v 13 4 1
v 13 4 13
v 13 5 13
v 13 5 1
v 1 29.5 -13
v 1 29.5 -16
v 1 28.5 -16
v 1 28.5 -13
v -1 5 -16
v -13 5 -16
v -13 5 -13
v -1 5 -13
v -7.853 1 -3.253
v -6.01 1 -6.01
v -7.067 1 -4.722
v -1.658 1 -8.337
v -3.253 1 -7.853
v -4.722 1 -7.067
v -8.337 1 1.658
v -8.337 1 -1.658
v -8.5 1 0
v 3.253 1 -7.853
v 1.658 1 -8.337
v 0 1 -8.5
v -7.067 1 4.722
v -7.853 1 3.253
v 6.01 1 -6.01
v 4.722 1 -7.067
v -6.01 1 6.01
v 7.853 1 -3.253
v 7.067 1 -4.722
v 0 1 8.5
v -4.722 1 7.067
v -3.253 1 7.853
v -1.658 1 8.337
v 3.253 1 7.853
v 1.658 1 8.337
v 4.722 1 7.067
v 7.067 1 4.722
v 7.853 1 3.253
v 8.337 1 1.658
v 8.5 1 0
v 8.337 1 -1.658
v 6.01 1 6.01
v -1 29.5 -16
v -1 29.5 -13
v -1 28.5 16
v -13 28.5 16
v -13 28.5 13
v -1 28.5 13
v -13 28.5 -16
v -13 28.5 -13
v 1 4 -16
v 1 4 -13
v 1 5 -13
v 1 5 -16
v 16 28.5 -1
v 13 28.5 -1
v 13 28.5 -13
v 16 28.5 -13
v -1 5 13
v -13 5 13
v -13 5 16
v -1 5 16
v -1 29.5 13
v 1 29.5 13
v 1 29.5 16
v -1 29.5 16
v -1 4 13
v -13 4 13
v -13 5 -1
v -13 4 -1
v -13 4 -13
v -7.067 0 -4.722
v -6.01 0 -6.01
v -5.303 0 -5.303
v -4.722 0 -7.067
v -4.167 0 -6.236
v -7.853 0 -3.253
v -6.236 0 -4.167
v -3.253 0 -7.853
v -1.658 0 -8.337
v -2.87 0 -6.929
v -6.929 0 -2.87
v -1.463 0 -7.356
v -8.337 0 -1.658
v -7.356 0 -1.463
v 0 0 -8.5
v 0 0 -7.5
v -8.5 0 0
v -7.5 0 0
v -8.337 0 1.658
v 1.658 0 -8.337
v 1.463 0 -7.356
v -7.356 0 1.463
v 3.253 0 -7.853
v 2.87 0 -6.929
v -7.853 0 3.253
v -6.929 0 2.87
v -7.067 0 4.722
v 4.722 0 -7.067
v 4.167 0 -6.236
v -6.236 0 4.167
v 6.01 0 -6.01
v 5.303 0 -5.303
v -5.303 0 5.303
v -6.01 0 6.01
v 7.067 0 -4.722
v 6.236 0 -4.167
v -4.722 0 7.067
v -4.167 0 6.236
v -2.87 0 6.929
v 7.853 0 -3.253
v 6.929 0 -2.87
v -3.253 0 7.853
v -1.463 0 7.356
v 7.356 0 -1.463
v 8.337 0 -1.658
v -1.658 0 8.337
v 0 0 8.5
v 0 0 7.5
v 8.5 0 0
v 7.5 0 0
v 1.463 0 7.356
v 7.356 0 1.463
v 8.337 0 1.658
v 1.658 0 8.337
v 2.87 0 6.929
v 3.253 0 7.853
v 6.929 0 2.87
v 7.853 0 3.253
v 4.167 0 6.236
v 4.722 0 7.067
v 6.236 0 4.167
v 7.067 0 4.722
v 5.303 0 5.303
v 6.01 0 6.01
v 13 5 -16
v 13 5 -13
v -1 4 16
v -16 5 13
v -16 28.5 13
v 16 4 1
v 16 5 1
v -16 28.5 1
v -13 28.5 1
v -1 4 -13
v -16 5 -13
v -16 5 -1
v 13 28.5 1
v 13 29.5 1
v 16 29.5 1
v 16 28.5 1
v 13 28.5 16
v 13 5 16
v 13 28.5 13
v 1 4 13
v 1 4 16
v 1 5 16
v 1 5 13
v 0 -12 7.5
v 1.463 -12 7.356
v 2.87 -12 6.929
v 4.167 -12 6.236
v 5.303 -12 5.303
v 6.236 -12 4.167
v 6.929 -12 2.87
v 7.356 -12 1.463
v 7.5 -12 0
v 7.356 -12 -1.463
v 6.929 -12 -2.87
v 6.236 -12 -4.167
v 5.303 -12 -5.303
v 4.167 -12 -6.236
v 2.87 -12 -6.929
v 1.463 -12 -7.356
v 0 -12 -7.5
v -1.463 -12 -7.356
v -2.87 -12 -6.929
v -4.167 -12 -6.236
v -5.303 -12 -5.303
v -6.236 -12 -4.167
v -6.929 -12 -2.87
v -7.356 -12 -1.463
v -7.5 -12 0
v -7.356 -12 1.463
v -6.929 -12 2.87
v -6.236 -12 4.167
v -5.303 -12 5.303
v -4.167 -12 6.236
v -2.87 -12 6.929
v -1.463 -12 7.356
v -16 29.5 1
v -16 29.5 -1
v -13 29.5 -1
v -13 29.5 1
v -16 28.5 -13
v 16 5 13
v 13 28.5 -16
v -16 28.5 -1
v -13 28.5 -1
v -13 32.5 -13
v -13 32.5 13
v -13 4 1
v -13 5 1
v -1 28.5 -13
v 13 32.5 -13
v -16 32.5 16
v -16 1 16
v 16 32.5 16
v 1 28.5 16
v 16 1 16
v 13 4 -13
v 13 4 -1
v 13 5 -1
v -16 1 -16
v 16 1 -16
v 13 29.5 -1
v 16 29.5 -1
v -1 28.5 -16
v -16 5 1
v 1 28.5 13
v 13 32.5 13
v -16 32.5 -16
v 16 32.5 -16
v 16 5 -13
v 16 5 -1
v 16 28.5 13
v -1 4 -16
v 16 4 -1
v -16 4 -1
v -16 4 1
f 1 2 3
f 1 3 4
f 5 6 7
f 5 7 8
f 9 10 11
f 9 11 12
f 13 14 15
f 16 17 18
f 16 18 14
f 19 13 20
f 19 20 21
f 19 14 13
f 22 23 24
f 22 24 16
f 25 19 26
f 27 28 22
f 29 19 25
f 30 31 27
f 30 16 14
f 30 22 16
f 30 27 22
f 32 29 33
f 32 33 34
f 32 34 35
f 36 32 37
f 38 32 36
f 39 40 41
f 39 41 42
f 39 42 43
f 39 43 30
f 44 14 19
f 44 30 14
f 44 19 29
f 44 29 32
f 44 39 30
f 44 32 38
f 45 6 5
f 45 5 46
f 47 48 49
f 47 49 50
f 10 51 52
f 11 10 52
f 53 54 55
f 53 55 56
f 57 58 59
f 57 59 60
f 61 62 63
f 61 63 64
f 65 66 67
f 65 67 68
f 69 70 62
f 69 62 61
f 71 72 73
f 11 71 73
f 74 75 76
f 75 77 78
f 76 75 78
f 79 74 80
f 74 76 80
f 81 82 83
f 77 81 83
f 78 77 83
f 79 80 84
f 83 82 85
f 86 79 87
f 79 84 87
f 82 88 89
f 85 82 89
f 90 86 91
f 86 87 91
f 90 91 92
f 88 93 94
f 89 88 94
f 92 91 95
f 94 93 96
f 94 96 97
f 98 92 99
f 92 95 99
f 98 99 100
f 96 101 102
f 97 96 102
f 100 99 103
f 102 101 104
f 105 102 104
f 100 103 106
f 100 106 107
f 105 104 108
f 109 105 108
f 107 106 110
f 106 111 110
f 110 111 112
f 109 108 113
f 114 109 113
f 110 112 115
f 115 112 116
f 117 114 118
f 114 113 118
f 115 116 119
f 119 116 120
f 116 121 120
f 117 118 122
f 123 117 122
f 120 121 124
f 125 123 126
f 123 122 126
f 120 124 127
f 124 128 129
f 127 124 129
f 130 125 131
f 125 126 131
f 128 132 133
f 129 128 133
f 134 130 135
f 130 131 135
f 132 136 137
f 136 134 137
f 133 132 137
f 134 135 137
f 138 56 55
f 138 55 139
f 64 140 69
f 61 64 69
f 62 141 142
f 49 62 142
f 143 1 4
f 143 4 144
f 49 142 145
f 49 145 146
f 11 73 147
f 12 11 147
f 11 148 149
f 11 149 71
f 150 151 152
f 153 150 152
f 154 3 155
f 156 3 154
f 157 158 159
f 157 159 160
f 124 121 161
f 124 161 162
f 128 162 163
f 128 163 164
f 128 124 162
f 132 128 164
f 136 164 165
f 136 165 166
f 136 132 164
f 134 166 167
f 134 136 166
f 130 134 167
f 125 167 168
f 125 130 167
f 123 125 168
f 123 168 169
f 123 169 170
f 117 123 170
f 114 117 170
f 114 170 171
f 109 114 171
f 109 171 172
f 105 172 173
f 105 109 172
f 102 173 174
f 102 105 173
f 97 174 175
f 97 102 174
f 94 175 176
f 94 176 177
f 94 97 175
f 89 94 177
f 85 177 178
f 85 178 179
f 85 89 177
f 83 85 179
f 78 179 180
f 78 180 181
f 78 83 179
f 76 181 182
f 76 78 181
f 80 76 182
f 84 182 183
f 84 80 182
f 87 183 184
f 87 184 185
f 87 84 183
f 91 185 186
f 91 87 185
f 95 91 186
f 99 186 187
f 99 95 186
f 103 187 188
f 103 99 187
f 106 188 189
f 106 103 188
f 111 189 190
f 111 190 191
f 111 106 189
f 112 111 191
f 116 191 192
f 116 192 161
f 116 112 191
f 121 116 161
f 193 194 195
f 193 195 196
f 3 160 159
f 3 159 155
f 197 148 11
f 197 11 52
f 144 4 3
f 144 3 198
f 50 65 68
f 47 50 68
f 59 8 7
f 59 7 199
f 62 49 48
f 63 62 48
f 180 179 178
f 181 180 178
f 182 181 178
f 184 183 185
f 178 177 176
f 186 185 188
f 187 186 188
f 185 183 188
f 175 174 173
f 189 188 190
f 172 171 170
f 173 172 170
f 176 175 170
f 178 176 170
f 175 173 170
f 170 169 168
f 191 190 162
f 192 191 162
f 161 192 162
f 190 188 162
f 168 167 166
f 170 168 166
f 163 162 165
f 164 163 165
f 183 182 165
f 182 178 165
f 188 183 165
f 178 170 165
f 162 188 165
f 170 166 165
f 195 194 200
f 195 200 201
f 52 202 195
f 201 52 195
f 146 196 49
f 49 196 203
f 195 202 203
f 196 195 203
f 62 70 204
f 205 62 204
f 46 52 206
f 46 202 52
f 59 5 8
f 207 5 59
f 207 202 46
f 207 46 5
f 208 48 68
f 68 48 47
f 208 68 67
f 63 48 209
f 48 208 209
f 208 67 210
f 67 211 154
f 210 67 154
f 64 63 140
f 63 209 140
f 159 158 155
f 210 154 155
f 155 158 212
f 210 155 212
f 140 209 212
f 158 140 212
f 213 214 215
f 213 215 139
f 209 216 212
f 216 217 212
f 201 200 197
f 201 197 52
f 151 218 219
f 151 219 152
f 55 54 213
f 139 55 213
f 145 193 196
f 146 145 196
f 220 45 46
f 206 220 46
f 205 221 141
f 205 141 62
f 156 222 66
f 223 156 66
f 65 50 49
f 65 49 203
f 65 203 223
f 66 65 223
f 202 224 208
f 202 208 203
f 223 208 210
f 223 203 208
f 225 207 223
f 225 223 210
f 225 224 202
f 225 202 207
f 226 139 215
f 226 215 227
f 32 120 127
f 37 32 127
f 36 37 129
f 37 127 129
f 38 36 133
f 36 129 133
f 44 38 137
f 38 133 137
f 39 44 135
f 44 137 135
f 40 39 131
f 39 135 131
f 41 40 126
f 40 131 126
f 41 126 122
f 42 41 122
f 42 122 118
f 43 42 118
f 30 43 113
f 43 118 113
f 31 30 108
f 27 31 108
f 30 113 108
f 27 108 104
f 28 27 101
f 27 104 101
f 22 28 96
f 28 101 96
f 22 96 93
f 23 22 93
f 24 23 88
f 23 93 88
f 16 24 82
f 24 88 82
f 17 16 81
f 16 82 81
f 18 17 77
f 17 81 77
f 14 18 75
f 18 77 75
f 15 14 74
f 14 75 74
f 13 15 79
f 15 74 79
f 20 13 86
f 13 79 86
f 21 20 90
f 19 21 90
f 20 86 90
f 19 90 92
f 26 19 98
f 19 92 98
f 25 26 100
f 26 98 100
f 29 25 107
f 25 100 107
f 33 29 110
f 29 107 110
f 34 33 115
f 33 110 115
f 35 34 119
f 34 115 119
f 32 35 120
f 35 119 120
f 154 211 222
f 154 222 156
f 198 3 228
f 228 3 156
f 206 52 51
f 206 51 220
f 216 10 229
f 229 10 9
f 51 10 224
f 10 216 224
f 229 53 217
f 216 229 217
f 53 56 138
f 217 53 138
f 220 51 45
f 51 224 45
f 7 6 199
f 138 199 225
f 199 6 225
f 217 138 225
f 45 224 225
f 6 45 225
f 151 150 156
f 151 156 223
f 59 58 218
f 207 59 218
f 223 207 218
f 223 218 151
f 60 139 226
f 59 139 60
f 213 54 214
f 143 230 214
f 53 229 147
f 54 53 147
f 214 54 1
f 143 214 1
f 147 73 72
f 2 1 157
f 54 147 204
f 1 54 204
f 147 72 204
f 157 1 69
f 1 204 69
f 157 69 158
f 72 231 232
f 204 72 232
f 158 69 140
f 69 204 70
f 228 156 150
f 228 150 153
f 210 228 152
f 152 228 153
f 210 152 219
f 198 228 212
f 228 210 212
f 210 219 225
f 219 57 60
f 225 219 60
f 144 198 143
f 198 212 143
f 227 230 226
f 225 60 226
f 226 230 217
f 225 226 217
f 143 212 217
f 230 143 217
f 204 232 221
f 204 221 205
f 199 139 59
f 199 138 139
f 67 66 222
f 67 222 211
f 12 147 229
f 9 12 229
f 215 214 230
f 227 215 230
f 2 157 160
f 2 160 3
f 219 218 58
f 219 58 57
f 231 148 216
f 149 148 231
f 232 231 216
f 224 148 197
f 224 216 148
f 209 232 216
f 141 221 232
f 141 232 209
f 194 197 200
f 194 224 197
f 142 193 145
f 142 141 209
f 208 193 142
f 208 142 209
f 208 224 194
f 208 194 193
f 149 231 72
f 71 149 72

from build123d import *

# Parameters (mm, degrees)
ESQUISSE1_R             = 7.5
BOSS_EXTRU_1_DEPTH      = 12
ESQUISSE2_R             = 8.5
BOSS_EXTRU_2_DEPTH      = 1
ESQUISSE3_W             = 32
ESQUISSE3_H             = 32
ESQUISSE3_W_2           = 26
ESQUISSE3_H_2           = 26
ESQUISSE3_R             = 8.5
BOSS_EXTRU_3_DEPTH      = 31.5
ESQUISSE7_W             = 26
ESQUISSE7_H             = 26
ENL_V_MAT_EXTRU_2_DEPTH = 37.390245946
ESQUISSE8_W             = 26
ESQUISSE8_H             = 25.5
ENL_V_MAT_EXTRU_3_DEPTH = 49.334770094
ESQUISSE9_W             = 26
ESQUISSE9_H             = 25.5
ENL_V_MAT_EXTRU_4_DEPTH = 49.334770094
ESQUISSE10_W            = 12
ESQUISSE10_H            = 3
ESQUISSE10_W_2          = 3
ESQUISSE10_H_2          = 12
BOSS_EXTRU_5_DEPTH      = 1
ESQUISSE12_W            = 3
ESQUISSE12_H            = 12
BOSS_EXTRU_9_DEPTH      = 1
ESQUISSE13_W            = 12
ESQUISSE13_H            = 3
BOSS_EXTRU_10_DEPTH     = 1


with BuildPart() as part:
    # Esquisse1 → Boss.-Extru.1 (new body)
    with BuildSketch(Plane(origin=(0, 0, 0), x_dir=(1, 0, 0), z_dir=(0, 1, 0))):
        with Locations(Location((0, 0, 0), (0, 0, 270))):
            Circle(ESQUISSE1_R)
    extrude(amount=-BOSS_EXTRU_1_DEPTH)

    # Esquisse2 → Boss.-Extru.2 (add)
    with BuildSketch(Plane(origin=(0, 0, 0), x_dir=(1, 0, 0), z_dir=(0, 1, 0))):
        with Locations(Location((0, 0, 0), (0, 0, 270))):
            Circle(ESQUISSE2_R)
    extrude(amount=BOSS_EXTRU_2_DEPTH)


with BuildPart() as body_2:
    # Esquisse3 → Boss.-Extru.3 (new body)
    # profile 1 of 3: a face of its own
    with BuildSketch(Plane(origin=(0, 1, 0), x_dir=(1, 0, 0), z_dir=(0, 1, 0))):
        Rectangle(ESQUISSE3_W, ESQUISSE3_H)
        Rectangle(ESQUISSE3_W_2, ESQUISSE3_H_2, mode=Mode.SUBTRACT)
    # profile 2 of 3: a face of its own
    with BuildSketch(Plane(origin=(0, 1, 0), x_dir=(1, 0, 0), z_dir=(0, 1, 0))):
        Rectangle(ESQUISSE3_W_2, ESQUISSE3_H_2)
        with Locations(Location((0, 0, 0), (0, 0, 270))):
            Circle(ESQUISSE3_R, mode=Mode.SUBTRACT)
    # profile 3 of 3: a face of its own
    with BuildSketch(Plane(origin=(0, 1, 0), x_dir=(1, 0, 0), z_dir=(0, 1, 0))):
        with Locations(Location((0, 0, 0), (0, 0, 270))):
            Circle(ESQUISSE3_R)
    extrude(amount=BOSS_EXTRU_3_DEPTH)

    # Esquisse7 → Enlèv. mat.-Extru.2 (cut, through all)
    with BuildSketch(Plane(origin=(0, 4, 0), x_dir=(-1, 0, 0), z_dir=(0, -1, 0))):
        Rectangle(ESQUISSE7_W, ESQUISSE7_H)
    extrude(amount=-ENL_V_MAT_EXTRU_2_DEPTH, mode=Mode.SUBTRACT)

    # Esquisse8 → Enlèv. mat.-Extru.3 (cut, through all)
    with BuildSketch(Plane.ZY.offset(16)):
        with Locations((0, 16.75)):
            Rectangle(ESQUISSE8_W, ESQUISSE8_H)
    extrude(amount=-ENL_V_MAT_EXTRU_3_DEPTH, mode=Mode.SUBTRACT)

    # Esquisse9 → Enlèv. mat.-Extru.4 (cut, through all)
    with BuildSketch(Plane(origin=(0, 0, -16), x_dir=(-1, 0, 0), z_dir=(0, 0, -1))):
        with Locations((0, 16.75)):
            Rectangle(ESQUISSE9_W, ESQUISSE9_H)
    extrude(amount=-ENL_V_MAT_EXTRU_4_DEPTH, mode=Mode.SUBTRACT)

    # Esquisse10 → Boss.-Extru.5 (add)
    with BuildSketch(Plane(origin=(0, 4, 0), x_dir=(1, 0, 0), z_dir=(0, 1, 0))):
        with Locations((-7, 14.5)):
            Rectangle(ESQUISSE10_W, ESQUISSE10_H)
        with Locations((7, 14.5)):
            Rectangle(ESQUISSE10_W, ESQUISSE10_H)
        with Locations((14.5, 7)):
            Rectangle(ESQUISSE10_W_2, ESQUISSE10_H_2)
        with Locations((14.5, -7)):
            Rectangle(ESQUISSE10_W_2, ESQUISSE10_H_2)
        with Locations((7, -14.5)):
            Rectangle(ESQUISSE10_W, ESQUISSE10_H)
        with Locations((-7, -14.5)):
            Rectangle(ESQUISSE10_W, ESQUISSE10_H)
        with Locations((-14.5, -7)):
            Rectangle(ESQUISSE10_W_2, ESQUISSE10_H_2)
        with Locations((-14.5, 7)):
            Rectangle(ESQUISSE10_W_2, ESQUISSE10_H_2)
    extrude(amount=BOSS_EXTRU_5_DEPTH)

    # Esquisse12 → Boss.-Extru.9 (add)
    with BuildSketch(Plane.XZ.offset(-29.5)):
        with Locations((-14.5, 7)):
            Rectangle(ESQUISSE12_W, ESQUISSE12_H)
        with Locations((-14.5, -7)):
            Rectangle(ESQUISSE12_W, ESQUISSE12_H)
        with Locations((14.5, 7)):
            Rectangle(ESQUISSE12_W, ESQUISSE12_H)
        with Locations((14.5, -7)):
            Rectangle(ESQUISSE12_W, ESQUISSE12_H)
    extrude(amount=BOSS_EXTRU_9_DEPTH)

    # Esquisse13 → Boss.-Extru.10 (add)
    with BuildSketch(Plane.XZ.offset(-29.5)):
        with Locations((-7, -14.5)):
            Rectangle(ESQUISSE13_W, ESQUISSE13_H)
        with Locations((7, -14.5)):
            Rectangle(ESQUISSE13_W, ESQUISSE13_H)
        with Locations((-7, 14.5)):
            Rectangle(ESQUISSE13_W, ESQUISSE13_H)
        with Locations((7, 14.5)):
            Rectangle(ESQUISSE13_W, ESQUISSE13_H)
    extrude(amount=BOSS_EXTRU_10_DEPTH)


solid = Compound([part.part, body_2.part])
